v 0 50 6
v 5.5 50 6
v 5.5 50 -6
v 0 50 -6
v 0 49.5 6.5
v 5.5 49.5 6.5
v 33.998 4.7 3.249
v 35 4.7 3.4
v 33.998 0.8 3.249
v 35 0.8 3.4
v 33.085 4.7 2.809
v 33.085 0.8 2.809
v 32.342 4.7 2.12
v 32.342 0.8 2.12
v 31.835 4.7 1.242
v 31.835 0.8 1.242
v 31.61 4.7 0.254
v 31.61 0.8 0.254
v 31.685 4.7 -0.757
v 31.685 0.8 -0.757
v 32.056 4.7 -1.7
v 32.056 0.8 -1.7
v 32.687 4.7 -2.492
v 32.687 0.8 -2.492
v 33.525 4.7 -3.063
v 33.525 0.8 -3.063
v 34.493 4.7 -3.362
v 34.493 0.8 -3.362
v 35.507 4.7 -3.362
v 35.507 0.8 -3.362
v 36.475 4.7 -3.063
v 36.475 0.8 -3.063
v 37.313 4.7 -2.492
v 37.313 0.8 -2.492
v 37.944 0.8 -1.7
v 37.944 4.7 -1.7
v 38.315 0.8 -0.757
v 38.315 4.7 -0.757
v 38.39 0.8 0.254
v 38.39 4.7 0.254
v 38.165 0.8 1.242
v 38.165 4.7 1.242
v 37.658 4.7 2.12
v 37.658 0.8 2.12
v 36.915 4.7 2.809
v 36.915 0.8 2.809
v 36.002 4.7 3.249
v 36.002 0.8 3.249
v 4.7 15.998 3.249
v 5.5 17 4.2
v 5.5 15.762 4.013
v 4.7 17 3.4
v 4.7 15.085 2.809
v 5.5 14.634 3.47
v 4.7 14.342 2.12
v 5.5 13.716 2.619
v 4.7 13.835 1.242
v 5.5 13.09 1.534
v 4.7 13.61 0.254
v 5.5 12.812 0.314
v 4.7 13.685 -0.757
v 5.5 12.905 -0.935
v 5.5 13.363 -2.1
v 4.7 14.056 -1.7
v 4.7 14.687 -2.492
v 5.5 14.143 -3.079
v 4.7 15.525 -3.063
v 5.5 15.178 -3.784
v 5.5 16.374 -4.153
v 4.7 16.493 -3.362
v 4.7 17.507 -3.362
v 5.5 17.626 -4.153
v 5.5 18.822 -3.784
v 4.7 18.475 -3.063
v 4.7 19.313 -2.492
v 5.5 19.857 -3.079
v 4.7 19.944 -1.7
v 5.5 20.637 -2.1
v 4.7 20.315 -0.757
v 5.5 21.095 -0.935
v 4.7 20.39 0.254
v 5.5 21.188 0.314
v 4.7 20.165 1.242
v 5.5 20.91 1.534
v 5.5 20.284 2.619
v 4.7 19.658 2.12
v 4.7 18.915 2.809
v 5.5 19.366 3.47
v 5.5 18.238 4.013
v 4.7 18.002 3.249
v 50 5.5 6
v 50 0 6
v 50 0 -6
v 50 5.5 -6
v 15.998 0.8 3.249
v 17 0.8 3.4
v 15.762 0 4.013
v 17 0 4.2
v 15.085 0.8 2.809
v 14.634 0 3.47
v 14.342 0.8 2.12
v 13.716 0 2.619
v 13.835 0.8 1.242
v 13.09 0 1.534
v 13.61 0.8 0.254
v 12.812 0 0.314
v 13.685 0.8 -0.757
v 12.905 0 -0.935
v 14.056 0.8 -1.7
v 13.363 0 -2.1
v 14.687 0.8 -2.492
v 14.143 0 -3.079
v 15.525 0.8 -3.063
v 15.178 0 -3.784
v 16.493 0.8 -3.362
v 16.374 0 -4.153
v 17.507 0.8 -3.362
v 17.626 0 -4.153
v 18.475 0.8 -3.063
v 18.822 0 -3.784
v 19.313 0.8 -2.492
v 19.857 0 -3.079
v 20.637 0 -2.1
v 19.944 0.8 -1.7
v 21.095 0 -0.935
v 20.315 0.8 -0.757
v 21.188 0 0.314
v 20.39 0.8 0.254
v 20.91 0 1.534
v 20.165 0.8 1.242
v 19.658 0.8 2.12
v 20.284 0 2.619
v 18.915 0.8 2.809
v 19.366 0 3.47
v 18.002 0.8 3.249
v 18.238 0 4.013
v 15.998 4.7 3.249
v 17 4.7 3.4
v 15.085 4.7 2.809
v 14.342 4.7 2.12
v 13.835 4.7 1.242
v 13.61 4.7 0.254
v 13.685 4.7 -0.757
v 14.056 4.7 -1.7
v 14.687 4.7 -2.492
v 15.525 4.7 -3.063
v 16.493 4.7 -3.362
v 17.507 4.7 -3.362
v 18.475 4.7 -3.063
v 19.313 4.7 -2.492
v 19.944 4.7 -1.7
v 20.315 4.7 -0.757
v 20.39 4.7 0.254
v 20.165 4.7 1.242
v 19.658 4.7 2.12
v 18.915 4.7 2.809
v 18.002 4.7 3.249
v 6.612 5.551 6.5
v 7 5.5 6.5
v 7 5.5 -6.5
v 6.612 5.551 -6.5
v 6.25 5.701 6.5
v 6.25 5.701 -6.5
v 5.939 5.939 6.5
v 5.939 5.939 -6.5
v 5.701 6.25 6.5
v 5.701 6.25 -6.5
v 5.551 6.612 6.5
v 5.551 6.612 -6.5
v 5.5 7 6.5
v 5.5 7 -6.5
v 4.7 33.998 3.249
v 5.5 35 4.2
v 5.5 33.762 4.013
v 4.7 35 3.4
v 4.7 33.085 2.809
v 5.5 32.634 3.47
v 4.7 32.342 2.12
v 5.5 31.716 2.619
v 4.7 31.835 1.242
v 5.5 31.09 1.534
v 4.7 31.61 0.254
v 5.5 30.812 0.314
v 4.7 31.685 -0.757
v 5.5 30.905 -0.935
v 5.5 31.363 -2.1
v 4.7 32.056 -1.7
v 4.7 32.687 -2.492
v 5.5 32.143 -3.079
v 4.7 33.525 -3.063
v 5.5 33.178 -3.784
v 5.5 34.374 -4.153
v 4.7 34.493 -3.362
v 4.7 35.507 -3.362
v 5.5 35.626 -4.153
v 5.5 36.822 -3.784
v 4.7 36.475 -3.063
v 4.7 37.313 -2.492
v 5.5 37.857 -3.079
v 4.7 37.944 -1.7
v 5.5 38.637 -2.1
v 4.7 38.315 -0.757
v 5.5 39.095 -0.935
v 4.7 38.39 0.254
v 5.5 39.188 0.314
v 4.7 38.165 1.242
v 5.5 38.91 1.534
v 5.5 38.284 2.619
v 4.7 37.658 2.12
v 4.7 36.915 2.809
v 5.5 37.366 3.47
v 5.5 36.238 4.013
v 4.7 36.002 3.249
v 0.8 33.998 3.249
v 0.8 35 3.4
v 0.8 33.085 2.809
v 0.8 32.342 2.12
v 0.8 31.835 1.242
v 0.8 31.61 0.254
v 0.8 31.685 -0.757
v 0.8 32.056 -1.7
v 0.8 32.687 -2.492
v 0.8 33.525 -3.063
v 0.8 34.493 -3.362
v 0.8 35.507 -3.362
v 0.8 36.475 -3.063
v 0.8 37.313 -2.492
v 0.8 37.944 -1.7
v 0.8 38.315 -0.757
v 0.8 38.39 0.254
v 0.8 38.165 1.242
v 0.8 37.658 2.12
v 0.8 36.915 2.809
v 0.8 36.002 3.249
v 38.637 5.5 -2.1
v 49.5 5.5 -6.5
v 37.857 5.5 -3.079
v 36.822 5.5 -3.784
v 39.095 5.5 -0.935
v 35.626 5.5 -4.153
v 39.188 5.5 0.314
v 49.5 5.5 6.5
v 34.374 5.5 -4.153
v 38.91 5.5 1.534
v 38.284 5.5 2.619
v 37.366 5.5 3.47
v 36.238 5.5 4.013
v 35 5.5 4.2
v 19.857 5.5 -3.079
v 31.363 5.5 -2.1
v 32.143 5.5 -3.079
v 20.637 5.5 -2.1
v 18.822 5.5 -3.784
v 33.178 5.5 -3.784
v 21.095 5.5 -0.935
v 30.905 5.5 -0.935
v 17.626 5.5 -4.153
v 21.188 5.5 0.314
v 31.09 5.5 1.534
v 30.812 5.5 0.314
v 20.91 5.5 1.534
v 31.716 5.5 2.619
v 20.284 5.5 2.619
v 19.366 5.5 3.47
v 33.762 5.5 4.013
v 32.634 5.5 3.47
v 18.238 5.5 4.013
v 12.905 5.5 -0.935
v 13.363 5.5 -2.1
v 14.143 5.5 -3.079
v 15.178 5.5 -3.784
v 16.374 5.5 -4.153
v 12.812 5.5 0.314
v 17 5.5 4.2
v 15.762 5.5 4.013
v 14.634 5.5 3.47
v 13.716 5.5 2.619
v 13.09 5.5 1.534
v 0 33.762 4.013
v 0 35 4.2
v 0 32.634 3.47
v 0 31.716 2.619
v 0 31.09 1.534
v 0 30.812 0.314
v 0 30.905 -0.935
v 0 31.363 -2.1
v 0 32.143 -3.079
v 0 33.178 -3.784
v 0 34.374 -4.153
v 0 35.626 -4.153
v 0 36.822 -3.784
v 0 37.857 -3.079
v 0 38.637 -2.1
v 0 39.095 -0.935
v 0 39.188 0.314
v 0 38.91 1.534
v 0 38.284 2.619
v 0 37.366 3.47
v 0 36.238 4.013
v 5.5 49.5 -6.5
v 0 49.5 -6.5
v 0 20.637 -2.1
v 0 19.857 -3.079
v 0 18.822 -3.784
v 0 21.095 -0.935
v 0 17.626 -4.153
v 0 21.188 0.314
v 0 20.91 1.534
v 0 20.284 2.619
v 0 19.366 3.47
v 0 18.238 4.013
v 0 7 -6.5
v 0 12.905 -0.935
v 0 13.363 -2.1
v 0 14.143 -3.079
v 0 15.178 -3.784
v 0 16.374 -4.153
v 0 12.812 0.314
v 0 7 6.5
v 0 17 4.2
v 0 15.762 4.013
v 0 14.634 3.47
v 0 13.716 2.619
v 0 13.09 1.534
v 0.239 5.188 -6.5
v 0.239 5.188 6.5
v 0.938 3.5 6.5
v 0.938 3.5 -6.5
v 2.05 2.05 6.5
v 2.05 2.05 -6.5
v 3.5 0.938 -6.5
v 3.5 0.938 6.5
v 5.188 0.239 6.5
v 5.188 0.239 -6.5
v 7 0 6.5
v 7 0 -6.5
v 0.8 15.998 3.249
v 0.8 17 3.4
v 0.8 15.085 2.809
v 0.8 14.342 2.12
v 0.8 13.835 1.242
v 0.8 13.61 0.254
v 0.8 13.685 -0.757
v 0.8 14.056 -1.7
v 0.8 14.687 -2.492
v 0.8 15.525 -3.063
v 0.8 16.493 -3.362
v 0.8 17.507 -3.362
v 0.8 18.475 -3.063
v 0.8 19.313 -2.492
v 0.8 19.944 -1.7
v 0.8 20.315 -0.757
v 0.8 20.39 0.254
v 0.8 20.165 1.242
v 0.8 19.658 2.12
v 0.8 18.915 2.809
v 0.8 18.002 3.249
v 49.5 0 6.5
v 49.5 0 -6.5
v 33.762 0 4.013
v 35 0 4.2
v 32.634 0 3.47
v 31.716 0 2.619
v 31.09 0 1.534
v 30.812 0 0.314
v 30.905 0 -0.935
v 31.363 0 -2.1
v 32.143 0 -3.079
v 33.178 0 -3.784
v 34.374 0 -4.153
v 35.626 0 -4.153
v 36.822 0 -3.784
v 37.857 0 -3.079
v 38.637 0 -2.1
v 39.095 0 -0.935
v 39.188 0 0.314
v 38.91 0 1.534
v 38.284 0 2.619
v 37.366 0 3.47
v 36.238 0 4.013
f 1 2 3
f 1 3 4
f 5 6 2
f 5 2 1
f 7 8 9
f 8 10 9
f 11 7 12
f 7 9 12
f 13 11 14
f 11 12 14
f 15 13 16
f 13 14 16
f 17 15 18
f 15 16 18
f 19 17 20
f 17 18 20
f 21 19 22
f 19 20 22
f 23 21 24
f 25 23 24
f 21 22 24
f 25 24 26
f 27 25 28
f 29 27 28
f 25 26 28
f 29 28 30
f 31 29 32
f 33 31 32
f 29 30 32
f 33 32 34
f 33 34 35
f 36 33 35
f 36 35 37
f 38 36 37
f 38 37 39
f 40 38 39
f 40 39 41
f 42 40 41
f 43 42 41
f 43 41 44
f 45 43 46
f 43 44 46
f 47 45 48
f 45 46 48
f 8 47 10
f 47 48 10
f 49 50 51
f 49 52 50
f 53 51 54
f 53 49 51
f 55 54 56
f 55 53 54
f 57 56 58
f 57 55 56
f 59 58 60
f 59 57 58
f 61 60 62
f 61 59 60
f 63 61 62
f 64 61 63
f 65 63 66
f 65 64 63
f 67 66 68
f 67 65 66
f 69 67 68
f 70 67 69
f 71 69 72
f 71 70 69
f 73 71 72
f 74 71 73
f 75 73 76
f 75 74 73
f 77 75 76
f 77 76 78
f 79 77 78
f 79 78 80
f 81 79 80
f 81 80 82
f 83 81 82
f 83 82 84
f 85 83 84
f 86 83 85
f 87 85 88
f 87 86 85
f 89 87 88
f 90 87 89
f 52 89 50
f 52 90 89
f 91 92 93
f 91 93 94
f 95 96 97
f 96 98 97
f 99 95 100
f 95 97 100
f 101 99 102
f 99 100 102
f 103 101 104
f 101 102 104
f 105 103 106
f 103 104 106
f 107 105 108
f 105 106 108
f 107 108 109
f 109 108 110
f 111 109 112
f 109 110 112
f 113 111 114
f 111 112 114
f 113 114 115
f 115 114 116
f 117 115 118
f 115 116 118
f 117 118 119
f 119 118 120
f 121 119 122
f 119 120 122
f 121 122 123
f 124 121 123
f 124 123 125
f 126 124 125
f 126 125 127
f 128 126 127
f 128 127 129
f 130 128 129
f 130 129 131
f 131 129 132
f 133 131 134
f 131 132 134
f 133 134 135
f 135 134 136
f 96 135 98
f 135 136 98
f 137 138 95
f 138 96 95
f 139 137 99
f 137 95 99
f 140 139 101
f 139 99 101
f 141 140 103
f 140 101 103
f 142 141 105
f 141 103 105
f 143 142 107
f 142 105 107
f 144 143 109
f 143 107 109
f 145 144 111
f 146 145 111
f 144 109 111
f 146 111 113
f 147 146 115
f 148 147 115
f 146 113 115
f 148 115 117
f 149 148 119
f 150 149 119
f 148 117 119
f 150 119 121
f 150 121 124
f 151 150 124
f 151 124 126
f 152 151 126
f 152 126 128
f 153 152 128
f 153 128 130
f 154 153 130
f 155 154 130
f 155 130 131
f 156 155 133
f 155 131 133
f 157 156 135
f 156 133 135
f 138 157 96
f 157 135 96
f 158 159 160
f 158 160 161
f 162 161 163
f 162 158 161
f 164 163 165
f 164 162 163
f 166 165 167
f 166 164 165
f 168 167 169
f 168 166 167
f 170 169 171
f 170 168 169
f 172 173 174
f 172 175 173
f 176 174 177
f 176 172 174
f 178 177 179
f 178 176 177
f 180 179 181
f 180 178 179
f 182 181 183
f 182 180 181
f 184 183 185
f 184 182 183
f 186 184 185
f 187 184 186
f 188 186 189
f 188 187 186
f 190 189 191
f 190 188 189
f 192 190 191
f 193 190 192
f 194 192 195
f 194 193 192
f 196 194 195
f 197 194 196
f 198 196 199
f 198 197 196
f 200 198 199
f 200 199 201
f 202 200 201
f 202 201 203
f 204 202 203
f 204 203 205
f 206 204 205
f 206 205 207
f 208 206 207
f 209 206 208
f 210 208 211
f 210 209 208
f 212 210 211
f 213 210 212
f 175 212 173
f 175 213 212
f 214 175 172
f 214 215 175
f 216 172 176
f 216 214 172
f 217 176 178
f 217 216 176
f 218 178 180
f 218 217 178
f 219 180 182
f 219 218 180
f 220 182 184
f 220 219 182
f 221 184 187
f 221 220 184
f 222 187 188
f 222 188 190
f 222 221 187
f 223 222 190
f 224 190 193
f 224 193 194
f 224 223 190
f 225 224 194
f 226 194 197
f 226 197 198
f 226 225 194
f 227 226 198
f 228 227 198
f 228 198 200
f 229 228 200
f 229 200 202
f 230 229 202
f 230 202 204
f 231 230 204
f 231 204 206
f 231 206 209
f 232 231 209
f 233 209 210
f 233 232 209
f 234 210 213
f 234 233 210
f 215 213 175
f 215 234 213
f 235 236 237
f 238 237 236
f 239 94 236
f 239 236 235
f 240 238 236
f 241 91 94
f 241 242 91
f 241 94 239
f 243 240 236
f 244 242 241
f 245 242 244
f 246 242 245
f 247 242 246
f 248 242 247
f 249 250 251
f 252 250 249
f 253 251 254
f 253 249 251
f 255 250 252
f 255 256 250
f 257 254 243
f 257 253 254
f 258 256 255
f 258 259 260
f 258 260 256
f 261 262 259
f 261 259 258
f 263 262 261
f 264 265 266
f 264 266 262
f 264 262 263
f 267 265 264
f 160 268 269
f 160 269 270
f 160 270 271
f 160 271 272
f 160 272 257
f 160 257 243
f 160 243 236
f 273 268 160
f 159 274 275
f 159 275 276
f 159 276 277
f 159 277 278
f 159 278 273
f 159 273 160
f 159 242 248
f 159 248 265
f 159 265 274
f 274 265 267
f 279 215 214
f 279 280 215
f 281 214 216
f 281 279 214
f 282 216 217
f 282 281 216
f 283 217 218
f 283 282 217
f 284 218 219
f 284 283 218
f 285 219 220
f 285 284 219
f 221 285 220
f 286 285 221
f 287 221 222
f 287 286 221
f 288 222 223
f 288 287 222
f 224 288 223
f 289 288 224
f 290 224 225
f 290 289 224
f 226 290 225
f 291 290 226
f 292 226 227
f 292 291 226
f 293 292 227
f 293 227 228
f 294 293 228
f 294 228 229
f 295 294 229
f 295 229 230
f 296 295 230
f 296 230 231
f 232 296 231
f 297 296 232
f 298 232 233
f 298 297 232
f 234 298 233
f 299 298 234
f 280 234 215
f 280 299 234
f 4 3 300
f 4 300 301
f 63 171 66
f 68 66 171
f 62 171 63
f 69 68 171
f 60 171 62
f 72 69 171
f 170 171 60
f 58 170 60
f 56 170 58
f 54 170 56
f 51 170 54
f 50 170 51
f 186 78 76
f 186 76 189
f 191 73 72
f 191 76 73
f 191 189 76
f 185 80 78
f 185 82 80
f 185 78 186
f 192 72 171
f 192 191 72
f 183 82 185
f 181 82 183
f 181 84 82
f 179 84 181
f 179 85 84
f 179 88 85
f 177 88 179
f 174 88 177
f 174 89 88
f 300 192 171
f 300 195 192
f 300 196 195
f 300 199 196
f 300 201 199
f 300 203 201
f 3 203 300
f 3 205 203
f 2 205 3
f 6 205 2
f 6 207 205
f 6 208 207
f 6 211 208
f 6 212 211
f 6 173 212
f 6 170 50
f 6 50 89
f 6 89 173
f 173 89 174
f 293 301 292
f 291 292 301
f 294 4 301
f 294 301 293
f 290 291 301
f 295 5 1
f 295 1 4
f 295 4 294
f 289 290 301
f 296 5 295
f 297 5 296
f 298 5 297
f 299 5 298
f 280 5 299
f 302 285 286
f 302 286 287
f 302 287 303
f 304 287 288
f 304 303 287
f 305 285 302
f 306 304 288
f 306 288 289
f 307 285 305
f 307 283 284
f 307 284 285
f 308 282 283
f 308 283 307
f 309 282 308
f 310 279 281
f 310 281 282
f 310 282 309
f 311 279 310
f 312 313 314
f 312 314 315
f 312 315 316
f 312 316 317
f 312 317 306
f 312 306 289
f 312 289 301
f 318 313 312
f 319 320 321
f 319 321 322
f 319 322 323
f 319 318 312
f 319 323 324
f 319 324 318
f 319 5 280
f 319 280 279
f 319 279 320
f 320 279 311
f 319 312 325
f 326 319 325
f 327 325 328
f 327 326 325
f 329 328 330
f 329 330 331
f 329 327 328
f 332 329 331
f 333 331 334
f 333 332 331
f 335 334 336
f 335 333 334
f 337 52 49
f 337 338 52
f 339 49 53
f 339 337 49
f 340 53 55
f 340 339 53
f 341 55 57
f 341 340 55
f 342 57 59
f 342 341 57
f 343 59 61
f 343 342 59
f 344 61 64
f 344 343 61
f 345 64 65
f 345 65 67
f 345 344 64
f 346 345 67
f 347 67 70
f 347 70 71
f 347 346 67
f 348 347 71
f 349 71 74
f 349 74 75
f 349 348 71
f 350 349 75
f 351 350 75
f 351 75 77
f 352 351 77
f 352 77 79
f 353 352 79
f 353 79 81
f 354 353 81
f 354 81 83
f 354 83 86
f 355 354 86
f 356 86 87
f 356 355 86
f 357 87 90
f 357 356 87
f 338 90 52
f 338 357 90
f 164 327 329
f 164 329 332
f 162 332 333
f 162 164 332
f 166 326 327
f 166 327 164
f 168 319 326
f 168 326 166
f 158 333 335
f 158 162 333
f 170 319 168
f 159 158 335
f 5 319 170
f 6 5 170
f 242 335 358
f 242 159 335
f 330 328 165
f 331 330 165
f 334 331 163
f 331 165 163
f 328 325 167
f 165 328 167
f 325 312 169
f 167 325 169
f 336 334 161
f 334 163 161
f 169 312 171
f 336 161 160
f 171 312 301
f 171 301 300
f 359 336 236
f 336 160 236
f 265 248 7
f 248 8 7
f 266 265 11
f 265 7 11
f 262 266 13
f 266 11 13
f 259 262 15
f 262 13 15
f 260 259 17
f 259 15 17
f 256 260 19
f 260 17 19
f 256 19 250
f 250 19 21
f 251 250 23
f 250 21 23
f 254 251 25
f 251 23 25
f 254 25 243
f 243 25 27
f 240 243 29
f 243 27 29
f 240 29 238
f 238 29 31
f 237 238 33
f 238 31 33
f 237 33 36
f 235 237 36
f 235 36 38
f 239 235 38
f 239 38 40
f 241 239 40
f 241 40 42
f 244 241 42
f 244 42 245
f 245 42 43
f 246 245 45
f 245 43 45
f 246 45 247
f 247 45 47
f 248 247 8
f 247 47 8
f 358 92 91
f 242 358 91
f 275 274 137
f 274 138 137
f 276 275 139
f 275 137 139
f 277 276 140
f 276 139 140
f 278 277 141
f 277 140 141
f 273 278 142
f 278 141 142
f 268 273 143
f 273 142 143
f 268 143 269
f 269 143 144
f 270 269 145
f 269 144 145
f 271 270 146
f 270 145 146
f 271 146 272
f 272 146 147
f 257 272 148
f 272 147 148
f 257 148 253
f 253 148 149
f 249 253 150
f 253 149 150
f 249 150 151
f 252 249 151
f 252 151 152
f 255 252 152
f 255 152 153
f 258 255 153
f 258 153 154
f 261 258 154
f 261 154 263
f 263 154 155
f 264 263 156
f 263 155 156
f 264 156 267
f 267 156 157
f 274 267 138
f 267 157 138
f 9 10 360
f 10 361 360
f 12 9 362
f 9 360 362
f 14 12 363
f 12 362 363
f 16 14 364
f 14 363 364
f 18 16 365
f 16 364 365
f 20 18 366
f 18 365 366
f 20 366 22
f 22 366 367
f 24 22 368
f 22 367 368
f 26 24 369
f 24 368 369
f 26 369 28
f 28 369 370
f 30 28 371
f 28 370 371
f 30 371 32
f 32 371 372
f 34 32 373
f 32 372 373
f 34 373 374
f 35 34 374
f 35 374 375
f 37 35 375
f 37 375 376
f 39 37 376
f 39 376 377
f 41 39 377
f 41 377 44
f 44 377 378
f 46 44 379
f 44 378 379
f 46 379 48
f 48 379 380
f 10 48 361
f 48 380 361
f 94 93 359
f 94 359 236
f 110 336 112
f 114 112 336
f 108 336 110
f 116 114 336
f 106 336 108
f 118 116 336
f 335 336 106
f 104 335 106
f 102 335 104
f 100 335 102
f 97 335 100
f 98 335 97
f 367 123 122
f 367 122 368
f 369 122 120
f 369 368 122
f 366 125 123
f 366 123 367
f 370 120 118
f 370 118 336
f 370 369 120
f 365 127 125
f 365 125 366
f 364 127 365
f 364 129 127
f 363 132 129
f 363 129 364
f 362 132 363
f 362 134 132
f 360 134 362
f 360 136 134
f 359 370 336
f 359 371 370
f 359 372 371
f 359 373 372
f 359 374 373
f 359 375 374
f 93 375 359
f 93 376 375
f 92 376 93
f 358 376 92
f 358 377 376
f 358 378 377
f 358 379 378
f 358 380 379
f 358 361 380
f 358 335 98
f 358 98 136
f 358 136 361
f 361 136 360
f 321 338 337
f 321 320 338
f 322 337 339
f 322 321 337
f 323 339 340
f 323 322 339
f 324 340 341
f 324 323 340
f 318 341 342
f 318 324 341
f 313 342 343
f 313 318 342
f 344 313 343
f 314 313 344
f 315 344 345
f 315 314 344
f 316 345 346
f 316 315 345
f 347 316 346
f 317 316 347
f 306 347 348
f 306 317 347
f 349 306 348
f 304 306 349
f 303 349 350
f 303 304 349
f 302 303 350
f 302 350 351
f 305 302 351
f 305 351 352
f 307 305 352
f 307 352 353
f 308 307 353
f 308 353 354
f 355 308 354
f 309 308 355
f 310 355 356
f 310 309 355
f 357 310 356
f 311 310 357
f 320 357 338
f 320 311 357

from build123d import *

# Parameters (mm, degrees)
EXTRUDE_1_DEPTH            = 6.5
HOLE_WIZARD_M81_AT_2_COUNT = 2
HOLE_WIZARD_M81_AT_2_PITCH = 18
CHAMFER_1_SIZE             = 0.5


with BuildPart() as part:
    # Эскиз1 → Бобышка-Вытянуть1 (new body, symmetric)
    with BuildSketch(Plane.XY):
        with BuildLine():
            Line((0, 50), (0, 7))
            ThreePointArc((0, 7), (2.050252532, 2.050252532), (7, 0))
            Line((7, 0), (50, 0))
            Line((50, 0), (50, 5.5))
            Line((50, 5.5), (7, 5.5))
            ThreePointArc((7, 5.5), (5.939339828, 5.939339828), (5.5, 7))
            Line((5.5, 7), (5.5, 50))
            Line((5.5, 50), (0, 50))
        make_face()
    extrude(amount=EXTRUDE_1_DEPTH, both=True)

    # Эскиз5 → Отверстие обработанное метчиком M81 (revolve, cut)
    with BuildSketch(Plane.ZX.offset(35)):
        Polygon((0, 0), (0, 5.5), (4.2, 5.5), (3.4, 4.7), (3.4, 0.8), (4.2, 0), align=None)
    hole_wizard_m81 = revolve(axis=Axis((-6.35, 35, 0), (1, 0, 0)), mode=Mode.SUBTRACT)

    # Отверстие обработанное метчиком M81 at 2: Отверстие обработанное метчиком M81 ×2
    with Locations(*[(0, -i * HOLE_WIZARD_M81_AT_2_PITCH, 0) for i in range(1, HOLE_WIZARD_M81_AT_2_COUNT)]):
        add(hole_wizard_m81, mode=Mode.SUBTRACT)

    # Зеркальное отражение1: Отверстие обработанное метчиком M81 across plane
    add(hole_wizard_m81.mirror(Plane(origin=(0, 0, 0), x_dir=(0, 0, 1), z_dir=(-0.707106781, 0.707106781, 0))), mode=Mode.SUBTRACT)

    # Зеркальное отражение1 copy 1 sketch → Зеркальное отражение1 copy 1 (revolve, cut)
    with BuildSketch(Plane(origin=(17, 0, 0), x_dir=(0, 0, 1), z_dir=(1, 0, 0))):
        Polygon((0, 0), (0, -5.5), (4.2, -5.5), (3.4, -4.7), (3.4, -0.8), (4.2, 0), align=None)
    revolve(axis=Axis((17, -6.35, 0), (0, -1, 0)), mode=Mode.SUBTRACT)

    # Фаска1
    chamfer_1_edges = [part.edges().sort_by_distance(p)[0] for p in [
        (2.75, 50, -6.5),
        (50, 2.75, 6.5),
        (2.75, 50, 6.5),
        (50, 2.75, -6.5),
    ]]
    chamfer(chamfer_1_edges, length=CHAMFER_1_SIZE)


solid = part.part
